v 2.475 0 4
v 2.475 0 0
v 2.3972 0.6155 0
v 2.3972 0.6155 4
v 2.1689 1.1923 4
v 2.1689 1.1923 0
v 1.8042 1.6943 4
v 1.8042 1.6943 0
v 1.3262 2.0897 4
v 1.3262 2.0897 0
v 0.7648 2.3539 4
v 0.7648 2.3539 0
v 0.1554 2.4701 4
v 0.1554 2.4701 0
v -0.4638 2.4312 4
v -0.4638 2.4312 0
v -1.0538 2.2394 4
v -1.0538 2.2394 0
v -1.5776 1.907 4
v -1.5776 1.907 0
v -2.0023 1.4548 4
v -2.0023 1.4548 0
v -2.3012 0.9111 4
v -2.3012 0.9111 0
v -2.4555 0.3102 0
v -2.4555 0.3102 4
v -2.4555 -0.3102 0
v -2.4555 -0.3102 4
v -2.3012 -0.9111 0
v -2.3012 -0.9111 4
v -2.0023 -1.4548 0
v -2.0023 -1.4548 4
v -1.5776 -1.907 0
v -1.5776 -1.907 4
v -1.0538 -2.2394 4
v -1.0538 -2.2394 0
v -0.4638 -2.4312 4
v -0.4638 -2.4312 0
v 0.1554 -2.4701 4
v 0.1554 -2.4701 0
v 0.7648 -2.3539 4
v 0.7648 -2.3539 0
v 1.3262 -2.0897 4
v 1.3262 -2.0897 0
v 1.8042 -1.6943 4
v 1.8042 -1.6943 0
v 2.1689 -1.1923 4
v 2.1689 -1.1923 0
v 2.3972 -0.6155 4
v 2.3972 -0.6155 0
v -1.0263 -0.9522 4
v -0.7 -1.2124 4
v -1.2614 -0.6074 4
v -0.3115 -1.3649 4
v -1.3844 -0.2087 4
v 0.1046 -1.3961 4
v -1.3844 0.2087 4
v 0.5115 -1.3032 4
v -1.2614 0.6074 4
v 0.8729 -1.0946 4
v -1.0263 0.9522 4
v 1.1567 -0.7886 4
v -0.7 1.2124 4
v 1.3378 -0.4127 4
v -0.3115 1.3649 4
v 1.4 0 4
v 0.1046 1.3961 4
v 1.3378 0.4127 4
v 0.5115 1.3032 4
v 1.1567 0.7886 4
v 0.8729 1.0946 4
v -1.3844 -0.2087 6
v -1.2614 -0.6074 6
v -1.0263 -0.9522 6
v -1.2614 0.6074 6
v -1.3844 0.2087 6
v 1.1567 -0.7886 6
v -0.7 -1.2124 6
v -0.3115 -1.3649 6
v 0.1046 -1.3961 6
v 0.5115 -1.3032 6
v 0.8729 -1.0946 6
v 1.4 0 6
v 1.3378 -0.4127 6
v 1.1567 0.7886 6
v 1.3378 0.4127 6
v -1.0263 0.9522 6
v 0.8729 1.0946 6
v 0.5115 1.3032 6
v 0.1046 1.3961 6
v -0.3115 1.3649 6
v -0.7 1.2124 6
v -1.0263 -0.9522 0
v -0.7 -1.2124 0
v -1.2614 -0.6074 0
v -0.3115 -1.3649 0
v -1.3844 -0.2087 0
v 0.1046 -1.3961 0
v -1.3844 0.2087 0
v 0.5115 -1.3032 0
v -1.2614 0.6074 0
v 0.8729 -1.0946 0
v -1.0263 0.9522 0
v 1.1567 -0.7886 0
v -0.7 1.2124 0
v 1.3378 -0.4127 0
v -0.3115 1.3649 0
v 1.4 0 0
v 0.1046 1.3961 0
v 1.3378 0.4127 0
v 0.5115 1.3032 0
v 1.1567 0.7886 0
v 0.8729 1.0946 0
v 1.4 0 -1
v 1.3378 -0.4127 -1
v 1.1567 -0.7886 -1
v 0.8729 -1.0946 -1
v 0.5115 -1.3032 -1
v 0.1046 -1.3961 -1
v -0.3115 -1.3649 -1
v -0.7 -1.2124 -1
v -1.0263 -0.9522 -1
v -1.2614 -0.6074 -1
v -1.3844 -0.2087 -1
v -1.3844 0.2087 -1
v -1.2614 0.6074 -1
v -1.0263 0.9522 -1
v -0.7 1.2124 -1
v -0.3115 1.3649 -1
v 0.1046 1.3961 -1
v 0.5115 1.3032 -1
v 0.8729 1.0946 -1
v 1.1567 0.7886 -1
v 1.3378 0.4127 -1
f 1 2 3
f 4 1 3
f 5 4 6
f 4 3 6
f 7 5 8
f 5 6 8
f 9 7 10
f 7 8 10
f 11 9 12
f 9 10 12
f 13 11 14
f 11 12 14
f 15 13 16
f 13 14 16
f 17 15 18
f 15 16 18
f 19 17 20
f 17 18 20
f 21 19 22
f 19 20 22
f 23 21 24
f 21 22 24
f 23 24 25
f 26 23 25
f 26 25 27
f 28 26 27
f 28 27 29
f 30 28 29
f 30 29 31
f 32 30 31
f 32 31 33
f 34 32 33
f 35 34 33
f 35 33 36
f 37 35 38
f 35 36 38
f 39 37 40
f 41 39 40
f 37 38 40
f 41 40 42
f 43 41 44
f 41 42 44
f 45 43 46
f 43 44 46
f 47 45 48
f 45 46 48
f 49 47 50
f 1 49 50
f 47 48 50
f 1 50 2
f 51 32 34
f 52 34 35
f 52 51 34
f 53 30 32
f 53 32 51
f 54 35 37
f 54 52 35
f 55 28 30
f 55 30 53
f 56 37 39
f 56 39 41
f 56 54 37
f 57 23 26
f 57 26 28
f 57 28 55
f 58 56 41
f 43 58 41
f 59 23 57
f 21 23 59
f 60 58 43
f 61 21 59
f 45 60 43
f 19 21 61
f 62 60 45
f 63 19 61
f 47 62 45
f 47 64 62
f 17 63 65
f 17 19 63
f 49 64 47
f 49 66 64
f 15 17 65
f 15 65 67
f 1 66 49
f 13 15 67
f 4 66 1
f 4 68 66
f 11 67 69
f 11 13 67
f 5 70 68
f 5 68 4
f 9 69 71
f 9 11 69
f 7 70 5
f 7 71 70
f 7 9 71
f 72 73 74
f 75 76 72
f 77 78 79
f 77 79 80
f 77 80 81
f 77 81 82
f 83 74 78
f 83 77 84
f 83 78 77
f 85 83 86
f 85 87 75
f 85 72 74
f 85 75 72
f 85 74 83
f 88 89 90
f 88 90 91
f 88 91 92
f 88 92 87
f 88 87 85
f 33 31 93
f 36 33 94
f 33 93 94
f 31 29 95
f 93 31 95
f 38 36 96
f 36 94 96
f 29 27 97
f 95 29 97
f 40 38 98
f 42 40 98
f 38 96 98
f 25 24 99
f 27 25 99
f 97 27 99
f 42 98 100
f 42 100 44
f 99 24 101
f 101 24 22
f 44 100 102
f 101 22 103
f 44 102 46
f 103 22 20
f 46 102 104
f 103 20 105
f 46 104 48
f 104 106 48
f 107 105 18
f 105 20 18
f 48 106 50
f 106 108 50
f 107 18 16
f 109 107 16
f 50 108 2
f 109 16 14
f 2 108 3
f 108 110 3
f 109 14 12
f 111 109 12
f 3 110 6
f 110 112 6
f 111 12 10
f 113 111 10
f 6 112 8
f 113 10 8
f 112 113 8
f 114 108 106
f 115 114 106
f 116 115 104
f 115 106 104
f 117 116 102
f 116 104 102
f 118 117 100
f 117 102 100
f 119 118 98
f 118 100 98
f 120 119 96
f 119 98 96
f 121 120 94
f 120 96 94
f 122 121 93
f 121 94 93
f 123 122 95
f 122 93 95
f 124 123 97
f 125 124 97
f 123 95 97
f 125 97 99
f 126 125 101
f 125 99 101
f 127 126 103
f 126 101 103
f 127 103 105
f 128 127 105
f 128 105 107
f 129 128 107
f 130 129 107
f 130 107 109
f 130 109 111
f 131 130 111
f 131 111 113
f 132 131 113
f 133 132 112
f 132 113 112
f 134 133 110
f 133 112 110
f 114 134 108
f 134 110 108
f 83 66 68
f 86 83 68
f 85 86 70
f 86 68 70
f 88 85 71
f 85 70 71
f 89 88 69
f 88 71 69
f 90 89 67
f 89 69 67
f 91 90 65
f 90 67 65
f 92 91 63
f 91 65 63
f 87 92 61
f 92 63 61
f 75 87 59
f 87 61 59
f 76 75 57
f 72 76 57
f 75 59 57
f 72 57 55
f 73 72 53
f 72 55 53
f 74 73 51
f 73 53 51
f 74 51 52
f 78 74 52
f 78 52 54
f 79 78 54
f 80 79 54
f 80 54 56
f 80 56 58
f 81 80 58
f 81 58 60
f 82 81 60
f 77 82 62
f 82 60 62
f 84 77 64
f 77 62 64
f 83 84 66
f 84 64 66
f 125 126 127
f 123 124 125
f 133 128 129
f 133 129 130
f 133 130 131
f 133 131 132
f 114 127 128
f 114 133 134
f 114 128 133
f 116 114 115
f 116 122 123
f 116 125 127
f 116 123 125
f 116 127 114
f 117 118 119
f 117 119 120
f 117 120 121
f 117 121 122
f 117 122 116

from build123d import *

# Parameters (mm, degrees)
F0_R     = 2.475
F0_R_2   = 1.5
F1_DEPTH = 4
F2_R     = 1.4
F3_DEPTH = 2
F4_R     = 1.4
F5_DEPTH = 1


with BuildPart() as f1:
    # F0 (on Top) → F1 (new body)
    with BuildSketch(Plane.XY):
        Circle(F0_R)
        Circle(F0_R_2, mode=Mode.SUBTRACT)
        Circle(F0_R_2)
    extrude(amount=F1_DEPTH)

    # F2 (on face) → F3 (join)
    with BuildSketch(Plane.XY.offset(4)):
        Circle(F2_R)
    extrude(amount=F3_DEPTH)

    # F4 (on face) → F5 (join)
    with BuildSketch(Plane(origin=(0, 0, 0), x_dir=(1, 0, 0), z_dir=(0, 0, -1))):
        Circle(F4_R)
    extrude(amount=F5_DEPTH)


solid = f1.part
